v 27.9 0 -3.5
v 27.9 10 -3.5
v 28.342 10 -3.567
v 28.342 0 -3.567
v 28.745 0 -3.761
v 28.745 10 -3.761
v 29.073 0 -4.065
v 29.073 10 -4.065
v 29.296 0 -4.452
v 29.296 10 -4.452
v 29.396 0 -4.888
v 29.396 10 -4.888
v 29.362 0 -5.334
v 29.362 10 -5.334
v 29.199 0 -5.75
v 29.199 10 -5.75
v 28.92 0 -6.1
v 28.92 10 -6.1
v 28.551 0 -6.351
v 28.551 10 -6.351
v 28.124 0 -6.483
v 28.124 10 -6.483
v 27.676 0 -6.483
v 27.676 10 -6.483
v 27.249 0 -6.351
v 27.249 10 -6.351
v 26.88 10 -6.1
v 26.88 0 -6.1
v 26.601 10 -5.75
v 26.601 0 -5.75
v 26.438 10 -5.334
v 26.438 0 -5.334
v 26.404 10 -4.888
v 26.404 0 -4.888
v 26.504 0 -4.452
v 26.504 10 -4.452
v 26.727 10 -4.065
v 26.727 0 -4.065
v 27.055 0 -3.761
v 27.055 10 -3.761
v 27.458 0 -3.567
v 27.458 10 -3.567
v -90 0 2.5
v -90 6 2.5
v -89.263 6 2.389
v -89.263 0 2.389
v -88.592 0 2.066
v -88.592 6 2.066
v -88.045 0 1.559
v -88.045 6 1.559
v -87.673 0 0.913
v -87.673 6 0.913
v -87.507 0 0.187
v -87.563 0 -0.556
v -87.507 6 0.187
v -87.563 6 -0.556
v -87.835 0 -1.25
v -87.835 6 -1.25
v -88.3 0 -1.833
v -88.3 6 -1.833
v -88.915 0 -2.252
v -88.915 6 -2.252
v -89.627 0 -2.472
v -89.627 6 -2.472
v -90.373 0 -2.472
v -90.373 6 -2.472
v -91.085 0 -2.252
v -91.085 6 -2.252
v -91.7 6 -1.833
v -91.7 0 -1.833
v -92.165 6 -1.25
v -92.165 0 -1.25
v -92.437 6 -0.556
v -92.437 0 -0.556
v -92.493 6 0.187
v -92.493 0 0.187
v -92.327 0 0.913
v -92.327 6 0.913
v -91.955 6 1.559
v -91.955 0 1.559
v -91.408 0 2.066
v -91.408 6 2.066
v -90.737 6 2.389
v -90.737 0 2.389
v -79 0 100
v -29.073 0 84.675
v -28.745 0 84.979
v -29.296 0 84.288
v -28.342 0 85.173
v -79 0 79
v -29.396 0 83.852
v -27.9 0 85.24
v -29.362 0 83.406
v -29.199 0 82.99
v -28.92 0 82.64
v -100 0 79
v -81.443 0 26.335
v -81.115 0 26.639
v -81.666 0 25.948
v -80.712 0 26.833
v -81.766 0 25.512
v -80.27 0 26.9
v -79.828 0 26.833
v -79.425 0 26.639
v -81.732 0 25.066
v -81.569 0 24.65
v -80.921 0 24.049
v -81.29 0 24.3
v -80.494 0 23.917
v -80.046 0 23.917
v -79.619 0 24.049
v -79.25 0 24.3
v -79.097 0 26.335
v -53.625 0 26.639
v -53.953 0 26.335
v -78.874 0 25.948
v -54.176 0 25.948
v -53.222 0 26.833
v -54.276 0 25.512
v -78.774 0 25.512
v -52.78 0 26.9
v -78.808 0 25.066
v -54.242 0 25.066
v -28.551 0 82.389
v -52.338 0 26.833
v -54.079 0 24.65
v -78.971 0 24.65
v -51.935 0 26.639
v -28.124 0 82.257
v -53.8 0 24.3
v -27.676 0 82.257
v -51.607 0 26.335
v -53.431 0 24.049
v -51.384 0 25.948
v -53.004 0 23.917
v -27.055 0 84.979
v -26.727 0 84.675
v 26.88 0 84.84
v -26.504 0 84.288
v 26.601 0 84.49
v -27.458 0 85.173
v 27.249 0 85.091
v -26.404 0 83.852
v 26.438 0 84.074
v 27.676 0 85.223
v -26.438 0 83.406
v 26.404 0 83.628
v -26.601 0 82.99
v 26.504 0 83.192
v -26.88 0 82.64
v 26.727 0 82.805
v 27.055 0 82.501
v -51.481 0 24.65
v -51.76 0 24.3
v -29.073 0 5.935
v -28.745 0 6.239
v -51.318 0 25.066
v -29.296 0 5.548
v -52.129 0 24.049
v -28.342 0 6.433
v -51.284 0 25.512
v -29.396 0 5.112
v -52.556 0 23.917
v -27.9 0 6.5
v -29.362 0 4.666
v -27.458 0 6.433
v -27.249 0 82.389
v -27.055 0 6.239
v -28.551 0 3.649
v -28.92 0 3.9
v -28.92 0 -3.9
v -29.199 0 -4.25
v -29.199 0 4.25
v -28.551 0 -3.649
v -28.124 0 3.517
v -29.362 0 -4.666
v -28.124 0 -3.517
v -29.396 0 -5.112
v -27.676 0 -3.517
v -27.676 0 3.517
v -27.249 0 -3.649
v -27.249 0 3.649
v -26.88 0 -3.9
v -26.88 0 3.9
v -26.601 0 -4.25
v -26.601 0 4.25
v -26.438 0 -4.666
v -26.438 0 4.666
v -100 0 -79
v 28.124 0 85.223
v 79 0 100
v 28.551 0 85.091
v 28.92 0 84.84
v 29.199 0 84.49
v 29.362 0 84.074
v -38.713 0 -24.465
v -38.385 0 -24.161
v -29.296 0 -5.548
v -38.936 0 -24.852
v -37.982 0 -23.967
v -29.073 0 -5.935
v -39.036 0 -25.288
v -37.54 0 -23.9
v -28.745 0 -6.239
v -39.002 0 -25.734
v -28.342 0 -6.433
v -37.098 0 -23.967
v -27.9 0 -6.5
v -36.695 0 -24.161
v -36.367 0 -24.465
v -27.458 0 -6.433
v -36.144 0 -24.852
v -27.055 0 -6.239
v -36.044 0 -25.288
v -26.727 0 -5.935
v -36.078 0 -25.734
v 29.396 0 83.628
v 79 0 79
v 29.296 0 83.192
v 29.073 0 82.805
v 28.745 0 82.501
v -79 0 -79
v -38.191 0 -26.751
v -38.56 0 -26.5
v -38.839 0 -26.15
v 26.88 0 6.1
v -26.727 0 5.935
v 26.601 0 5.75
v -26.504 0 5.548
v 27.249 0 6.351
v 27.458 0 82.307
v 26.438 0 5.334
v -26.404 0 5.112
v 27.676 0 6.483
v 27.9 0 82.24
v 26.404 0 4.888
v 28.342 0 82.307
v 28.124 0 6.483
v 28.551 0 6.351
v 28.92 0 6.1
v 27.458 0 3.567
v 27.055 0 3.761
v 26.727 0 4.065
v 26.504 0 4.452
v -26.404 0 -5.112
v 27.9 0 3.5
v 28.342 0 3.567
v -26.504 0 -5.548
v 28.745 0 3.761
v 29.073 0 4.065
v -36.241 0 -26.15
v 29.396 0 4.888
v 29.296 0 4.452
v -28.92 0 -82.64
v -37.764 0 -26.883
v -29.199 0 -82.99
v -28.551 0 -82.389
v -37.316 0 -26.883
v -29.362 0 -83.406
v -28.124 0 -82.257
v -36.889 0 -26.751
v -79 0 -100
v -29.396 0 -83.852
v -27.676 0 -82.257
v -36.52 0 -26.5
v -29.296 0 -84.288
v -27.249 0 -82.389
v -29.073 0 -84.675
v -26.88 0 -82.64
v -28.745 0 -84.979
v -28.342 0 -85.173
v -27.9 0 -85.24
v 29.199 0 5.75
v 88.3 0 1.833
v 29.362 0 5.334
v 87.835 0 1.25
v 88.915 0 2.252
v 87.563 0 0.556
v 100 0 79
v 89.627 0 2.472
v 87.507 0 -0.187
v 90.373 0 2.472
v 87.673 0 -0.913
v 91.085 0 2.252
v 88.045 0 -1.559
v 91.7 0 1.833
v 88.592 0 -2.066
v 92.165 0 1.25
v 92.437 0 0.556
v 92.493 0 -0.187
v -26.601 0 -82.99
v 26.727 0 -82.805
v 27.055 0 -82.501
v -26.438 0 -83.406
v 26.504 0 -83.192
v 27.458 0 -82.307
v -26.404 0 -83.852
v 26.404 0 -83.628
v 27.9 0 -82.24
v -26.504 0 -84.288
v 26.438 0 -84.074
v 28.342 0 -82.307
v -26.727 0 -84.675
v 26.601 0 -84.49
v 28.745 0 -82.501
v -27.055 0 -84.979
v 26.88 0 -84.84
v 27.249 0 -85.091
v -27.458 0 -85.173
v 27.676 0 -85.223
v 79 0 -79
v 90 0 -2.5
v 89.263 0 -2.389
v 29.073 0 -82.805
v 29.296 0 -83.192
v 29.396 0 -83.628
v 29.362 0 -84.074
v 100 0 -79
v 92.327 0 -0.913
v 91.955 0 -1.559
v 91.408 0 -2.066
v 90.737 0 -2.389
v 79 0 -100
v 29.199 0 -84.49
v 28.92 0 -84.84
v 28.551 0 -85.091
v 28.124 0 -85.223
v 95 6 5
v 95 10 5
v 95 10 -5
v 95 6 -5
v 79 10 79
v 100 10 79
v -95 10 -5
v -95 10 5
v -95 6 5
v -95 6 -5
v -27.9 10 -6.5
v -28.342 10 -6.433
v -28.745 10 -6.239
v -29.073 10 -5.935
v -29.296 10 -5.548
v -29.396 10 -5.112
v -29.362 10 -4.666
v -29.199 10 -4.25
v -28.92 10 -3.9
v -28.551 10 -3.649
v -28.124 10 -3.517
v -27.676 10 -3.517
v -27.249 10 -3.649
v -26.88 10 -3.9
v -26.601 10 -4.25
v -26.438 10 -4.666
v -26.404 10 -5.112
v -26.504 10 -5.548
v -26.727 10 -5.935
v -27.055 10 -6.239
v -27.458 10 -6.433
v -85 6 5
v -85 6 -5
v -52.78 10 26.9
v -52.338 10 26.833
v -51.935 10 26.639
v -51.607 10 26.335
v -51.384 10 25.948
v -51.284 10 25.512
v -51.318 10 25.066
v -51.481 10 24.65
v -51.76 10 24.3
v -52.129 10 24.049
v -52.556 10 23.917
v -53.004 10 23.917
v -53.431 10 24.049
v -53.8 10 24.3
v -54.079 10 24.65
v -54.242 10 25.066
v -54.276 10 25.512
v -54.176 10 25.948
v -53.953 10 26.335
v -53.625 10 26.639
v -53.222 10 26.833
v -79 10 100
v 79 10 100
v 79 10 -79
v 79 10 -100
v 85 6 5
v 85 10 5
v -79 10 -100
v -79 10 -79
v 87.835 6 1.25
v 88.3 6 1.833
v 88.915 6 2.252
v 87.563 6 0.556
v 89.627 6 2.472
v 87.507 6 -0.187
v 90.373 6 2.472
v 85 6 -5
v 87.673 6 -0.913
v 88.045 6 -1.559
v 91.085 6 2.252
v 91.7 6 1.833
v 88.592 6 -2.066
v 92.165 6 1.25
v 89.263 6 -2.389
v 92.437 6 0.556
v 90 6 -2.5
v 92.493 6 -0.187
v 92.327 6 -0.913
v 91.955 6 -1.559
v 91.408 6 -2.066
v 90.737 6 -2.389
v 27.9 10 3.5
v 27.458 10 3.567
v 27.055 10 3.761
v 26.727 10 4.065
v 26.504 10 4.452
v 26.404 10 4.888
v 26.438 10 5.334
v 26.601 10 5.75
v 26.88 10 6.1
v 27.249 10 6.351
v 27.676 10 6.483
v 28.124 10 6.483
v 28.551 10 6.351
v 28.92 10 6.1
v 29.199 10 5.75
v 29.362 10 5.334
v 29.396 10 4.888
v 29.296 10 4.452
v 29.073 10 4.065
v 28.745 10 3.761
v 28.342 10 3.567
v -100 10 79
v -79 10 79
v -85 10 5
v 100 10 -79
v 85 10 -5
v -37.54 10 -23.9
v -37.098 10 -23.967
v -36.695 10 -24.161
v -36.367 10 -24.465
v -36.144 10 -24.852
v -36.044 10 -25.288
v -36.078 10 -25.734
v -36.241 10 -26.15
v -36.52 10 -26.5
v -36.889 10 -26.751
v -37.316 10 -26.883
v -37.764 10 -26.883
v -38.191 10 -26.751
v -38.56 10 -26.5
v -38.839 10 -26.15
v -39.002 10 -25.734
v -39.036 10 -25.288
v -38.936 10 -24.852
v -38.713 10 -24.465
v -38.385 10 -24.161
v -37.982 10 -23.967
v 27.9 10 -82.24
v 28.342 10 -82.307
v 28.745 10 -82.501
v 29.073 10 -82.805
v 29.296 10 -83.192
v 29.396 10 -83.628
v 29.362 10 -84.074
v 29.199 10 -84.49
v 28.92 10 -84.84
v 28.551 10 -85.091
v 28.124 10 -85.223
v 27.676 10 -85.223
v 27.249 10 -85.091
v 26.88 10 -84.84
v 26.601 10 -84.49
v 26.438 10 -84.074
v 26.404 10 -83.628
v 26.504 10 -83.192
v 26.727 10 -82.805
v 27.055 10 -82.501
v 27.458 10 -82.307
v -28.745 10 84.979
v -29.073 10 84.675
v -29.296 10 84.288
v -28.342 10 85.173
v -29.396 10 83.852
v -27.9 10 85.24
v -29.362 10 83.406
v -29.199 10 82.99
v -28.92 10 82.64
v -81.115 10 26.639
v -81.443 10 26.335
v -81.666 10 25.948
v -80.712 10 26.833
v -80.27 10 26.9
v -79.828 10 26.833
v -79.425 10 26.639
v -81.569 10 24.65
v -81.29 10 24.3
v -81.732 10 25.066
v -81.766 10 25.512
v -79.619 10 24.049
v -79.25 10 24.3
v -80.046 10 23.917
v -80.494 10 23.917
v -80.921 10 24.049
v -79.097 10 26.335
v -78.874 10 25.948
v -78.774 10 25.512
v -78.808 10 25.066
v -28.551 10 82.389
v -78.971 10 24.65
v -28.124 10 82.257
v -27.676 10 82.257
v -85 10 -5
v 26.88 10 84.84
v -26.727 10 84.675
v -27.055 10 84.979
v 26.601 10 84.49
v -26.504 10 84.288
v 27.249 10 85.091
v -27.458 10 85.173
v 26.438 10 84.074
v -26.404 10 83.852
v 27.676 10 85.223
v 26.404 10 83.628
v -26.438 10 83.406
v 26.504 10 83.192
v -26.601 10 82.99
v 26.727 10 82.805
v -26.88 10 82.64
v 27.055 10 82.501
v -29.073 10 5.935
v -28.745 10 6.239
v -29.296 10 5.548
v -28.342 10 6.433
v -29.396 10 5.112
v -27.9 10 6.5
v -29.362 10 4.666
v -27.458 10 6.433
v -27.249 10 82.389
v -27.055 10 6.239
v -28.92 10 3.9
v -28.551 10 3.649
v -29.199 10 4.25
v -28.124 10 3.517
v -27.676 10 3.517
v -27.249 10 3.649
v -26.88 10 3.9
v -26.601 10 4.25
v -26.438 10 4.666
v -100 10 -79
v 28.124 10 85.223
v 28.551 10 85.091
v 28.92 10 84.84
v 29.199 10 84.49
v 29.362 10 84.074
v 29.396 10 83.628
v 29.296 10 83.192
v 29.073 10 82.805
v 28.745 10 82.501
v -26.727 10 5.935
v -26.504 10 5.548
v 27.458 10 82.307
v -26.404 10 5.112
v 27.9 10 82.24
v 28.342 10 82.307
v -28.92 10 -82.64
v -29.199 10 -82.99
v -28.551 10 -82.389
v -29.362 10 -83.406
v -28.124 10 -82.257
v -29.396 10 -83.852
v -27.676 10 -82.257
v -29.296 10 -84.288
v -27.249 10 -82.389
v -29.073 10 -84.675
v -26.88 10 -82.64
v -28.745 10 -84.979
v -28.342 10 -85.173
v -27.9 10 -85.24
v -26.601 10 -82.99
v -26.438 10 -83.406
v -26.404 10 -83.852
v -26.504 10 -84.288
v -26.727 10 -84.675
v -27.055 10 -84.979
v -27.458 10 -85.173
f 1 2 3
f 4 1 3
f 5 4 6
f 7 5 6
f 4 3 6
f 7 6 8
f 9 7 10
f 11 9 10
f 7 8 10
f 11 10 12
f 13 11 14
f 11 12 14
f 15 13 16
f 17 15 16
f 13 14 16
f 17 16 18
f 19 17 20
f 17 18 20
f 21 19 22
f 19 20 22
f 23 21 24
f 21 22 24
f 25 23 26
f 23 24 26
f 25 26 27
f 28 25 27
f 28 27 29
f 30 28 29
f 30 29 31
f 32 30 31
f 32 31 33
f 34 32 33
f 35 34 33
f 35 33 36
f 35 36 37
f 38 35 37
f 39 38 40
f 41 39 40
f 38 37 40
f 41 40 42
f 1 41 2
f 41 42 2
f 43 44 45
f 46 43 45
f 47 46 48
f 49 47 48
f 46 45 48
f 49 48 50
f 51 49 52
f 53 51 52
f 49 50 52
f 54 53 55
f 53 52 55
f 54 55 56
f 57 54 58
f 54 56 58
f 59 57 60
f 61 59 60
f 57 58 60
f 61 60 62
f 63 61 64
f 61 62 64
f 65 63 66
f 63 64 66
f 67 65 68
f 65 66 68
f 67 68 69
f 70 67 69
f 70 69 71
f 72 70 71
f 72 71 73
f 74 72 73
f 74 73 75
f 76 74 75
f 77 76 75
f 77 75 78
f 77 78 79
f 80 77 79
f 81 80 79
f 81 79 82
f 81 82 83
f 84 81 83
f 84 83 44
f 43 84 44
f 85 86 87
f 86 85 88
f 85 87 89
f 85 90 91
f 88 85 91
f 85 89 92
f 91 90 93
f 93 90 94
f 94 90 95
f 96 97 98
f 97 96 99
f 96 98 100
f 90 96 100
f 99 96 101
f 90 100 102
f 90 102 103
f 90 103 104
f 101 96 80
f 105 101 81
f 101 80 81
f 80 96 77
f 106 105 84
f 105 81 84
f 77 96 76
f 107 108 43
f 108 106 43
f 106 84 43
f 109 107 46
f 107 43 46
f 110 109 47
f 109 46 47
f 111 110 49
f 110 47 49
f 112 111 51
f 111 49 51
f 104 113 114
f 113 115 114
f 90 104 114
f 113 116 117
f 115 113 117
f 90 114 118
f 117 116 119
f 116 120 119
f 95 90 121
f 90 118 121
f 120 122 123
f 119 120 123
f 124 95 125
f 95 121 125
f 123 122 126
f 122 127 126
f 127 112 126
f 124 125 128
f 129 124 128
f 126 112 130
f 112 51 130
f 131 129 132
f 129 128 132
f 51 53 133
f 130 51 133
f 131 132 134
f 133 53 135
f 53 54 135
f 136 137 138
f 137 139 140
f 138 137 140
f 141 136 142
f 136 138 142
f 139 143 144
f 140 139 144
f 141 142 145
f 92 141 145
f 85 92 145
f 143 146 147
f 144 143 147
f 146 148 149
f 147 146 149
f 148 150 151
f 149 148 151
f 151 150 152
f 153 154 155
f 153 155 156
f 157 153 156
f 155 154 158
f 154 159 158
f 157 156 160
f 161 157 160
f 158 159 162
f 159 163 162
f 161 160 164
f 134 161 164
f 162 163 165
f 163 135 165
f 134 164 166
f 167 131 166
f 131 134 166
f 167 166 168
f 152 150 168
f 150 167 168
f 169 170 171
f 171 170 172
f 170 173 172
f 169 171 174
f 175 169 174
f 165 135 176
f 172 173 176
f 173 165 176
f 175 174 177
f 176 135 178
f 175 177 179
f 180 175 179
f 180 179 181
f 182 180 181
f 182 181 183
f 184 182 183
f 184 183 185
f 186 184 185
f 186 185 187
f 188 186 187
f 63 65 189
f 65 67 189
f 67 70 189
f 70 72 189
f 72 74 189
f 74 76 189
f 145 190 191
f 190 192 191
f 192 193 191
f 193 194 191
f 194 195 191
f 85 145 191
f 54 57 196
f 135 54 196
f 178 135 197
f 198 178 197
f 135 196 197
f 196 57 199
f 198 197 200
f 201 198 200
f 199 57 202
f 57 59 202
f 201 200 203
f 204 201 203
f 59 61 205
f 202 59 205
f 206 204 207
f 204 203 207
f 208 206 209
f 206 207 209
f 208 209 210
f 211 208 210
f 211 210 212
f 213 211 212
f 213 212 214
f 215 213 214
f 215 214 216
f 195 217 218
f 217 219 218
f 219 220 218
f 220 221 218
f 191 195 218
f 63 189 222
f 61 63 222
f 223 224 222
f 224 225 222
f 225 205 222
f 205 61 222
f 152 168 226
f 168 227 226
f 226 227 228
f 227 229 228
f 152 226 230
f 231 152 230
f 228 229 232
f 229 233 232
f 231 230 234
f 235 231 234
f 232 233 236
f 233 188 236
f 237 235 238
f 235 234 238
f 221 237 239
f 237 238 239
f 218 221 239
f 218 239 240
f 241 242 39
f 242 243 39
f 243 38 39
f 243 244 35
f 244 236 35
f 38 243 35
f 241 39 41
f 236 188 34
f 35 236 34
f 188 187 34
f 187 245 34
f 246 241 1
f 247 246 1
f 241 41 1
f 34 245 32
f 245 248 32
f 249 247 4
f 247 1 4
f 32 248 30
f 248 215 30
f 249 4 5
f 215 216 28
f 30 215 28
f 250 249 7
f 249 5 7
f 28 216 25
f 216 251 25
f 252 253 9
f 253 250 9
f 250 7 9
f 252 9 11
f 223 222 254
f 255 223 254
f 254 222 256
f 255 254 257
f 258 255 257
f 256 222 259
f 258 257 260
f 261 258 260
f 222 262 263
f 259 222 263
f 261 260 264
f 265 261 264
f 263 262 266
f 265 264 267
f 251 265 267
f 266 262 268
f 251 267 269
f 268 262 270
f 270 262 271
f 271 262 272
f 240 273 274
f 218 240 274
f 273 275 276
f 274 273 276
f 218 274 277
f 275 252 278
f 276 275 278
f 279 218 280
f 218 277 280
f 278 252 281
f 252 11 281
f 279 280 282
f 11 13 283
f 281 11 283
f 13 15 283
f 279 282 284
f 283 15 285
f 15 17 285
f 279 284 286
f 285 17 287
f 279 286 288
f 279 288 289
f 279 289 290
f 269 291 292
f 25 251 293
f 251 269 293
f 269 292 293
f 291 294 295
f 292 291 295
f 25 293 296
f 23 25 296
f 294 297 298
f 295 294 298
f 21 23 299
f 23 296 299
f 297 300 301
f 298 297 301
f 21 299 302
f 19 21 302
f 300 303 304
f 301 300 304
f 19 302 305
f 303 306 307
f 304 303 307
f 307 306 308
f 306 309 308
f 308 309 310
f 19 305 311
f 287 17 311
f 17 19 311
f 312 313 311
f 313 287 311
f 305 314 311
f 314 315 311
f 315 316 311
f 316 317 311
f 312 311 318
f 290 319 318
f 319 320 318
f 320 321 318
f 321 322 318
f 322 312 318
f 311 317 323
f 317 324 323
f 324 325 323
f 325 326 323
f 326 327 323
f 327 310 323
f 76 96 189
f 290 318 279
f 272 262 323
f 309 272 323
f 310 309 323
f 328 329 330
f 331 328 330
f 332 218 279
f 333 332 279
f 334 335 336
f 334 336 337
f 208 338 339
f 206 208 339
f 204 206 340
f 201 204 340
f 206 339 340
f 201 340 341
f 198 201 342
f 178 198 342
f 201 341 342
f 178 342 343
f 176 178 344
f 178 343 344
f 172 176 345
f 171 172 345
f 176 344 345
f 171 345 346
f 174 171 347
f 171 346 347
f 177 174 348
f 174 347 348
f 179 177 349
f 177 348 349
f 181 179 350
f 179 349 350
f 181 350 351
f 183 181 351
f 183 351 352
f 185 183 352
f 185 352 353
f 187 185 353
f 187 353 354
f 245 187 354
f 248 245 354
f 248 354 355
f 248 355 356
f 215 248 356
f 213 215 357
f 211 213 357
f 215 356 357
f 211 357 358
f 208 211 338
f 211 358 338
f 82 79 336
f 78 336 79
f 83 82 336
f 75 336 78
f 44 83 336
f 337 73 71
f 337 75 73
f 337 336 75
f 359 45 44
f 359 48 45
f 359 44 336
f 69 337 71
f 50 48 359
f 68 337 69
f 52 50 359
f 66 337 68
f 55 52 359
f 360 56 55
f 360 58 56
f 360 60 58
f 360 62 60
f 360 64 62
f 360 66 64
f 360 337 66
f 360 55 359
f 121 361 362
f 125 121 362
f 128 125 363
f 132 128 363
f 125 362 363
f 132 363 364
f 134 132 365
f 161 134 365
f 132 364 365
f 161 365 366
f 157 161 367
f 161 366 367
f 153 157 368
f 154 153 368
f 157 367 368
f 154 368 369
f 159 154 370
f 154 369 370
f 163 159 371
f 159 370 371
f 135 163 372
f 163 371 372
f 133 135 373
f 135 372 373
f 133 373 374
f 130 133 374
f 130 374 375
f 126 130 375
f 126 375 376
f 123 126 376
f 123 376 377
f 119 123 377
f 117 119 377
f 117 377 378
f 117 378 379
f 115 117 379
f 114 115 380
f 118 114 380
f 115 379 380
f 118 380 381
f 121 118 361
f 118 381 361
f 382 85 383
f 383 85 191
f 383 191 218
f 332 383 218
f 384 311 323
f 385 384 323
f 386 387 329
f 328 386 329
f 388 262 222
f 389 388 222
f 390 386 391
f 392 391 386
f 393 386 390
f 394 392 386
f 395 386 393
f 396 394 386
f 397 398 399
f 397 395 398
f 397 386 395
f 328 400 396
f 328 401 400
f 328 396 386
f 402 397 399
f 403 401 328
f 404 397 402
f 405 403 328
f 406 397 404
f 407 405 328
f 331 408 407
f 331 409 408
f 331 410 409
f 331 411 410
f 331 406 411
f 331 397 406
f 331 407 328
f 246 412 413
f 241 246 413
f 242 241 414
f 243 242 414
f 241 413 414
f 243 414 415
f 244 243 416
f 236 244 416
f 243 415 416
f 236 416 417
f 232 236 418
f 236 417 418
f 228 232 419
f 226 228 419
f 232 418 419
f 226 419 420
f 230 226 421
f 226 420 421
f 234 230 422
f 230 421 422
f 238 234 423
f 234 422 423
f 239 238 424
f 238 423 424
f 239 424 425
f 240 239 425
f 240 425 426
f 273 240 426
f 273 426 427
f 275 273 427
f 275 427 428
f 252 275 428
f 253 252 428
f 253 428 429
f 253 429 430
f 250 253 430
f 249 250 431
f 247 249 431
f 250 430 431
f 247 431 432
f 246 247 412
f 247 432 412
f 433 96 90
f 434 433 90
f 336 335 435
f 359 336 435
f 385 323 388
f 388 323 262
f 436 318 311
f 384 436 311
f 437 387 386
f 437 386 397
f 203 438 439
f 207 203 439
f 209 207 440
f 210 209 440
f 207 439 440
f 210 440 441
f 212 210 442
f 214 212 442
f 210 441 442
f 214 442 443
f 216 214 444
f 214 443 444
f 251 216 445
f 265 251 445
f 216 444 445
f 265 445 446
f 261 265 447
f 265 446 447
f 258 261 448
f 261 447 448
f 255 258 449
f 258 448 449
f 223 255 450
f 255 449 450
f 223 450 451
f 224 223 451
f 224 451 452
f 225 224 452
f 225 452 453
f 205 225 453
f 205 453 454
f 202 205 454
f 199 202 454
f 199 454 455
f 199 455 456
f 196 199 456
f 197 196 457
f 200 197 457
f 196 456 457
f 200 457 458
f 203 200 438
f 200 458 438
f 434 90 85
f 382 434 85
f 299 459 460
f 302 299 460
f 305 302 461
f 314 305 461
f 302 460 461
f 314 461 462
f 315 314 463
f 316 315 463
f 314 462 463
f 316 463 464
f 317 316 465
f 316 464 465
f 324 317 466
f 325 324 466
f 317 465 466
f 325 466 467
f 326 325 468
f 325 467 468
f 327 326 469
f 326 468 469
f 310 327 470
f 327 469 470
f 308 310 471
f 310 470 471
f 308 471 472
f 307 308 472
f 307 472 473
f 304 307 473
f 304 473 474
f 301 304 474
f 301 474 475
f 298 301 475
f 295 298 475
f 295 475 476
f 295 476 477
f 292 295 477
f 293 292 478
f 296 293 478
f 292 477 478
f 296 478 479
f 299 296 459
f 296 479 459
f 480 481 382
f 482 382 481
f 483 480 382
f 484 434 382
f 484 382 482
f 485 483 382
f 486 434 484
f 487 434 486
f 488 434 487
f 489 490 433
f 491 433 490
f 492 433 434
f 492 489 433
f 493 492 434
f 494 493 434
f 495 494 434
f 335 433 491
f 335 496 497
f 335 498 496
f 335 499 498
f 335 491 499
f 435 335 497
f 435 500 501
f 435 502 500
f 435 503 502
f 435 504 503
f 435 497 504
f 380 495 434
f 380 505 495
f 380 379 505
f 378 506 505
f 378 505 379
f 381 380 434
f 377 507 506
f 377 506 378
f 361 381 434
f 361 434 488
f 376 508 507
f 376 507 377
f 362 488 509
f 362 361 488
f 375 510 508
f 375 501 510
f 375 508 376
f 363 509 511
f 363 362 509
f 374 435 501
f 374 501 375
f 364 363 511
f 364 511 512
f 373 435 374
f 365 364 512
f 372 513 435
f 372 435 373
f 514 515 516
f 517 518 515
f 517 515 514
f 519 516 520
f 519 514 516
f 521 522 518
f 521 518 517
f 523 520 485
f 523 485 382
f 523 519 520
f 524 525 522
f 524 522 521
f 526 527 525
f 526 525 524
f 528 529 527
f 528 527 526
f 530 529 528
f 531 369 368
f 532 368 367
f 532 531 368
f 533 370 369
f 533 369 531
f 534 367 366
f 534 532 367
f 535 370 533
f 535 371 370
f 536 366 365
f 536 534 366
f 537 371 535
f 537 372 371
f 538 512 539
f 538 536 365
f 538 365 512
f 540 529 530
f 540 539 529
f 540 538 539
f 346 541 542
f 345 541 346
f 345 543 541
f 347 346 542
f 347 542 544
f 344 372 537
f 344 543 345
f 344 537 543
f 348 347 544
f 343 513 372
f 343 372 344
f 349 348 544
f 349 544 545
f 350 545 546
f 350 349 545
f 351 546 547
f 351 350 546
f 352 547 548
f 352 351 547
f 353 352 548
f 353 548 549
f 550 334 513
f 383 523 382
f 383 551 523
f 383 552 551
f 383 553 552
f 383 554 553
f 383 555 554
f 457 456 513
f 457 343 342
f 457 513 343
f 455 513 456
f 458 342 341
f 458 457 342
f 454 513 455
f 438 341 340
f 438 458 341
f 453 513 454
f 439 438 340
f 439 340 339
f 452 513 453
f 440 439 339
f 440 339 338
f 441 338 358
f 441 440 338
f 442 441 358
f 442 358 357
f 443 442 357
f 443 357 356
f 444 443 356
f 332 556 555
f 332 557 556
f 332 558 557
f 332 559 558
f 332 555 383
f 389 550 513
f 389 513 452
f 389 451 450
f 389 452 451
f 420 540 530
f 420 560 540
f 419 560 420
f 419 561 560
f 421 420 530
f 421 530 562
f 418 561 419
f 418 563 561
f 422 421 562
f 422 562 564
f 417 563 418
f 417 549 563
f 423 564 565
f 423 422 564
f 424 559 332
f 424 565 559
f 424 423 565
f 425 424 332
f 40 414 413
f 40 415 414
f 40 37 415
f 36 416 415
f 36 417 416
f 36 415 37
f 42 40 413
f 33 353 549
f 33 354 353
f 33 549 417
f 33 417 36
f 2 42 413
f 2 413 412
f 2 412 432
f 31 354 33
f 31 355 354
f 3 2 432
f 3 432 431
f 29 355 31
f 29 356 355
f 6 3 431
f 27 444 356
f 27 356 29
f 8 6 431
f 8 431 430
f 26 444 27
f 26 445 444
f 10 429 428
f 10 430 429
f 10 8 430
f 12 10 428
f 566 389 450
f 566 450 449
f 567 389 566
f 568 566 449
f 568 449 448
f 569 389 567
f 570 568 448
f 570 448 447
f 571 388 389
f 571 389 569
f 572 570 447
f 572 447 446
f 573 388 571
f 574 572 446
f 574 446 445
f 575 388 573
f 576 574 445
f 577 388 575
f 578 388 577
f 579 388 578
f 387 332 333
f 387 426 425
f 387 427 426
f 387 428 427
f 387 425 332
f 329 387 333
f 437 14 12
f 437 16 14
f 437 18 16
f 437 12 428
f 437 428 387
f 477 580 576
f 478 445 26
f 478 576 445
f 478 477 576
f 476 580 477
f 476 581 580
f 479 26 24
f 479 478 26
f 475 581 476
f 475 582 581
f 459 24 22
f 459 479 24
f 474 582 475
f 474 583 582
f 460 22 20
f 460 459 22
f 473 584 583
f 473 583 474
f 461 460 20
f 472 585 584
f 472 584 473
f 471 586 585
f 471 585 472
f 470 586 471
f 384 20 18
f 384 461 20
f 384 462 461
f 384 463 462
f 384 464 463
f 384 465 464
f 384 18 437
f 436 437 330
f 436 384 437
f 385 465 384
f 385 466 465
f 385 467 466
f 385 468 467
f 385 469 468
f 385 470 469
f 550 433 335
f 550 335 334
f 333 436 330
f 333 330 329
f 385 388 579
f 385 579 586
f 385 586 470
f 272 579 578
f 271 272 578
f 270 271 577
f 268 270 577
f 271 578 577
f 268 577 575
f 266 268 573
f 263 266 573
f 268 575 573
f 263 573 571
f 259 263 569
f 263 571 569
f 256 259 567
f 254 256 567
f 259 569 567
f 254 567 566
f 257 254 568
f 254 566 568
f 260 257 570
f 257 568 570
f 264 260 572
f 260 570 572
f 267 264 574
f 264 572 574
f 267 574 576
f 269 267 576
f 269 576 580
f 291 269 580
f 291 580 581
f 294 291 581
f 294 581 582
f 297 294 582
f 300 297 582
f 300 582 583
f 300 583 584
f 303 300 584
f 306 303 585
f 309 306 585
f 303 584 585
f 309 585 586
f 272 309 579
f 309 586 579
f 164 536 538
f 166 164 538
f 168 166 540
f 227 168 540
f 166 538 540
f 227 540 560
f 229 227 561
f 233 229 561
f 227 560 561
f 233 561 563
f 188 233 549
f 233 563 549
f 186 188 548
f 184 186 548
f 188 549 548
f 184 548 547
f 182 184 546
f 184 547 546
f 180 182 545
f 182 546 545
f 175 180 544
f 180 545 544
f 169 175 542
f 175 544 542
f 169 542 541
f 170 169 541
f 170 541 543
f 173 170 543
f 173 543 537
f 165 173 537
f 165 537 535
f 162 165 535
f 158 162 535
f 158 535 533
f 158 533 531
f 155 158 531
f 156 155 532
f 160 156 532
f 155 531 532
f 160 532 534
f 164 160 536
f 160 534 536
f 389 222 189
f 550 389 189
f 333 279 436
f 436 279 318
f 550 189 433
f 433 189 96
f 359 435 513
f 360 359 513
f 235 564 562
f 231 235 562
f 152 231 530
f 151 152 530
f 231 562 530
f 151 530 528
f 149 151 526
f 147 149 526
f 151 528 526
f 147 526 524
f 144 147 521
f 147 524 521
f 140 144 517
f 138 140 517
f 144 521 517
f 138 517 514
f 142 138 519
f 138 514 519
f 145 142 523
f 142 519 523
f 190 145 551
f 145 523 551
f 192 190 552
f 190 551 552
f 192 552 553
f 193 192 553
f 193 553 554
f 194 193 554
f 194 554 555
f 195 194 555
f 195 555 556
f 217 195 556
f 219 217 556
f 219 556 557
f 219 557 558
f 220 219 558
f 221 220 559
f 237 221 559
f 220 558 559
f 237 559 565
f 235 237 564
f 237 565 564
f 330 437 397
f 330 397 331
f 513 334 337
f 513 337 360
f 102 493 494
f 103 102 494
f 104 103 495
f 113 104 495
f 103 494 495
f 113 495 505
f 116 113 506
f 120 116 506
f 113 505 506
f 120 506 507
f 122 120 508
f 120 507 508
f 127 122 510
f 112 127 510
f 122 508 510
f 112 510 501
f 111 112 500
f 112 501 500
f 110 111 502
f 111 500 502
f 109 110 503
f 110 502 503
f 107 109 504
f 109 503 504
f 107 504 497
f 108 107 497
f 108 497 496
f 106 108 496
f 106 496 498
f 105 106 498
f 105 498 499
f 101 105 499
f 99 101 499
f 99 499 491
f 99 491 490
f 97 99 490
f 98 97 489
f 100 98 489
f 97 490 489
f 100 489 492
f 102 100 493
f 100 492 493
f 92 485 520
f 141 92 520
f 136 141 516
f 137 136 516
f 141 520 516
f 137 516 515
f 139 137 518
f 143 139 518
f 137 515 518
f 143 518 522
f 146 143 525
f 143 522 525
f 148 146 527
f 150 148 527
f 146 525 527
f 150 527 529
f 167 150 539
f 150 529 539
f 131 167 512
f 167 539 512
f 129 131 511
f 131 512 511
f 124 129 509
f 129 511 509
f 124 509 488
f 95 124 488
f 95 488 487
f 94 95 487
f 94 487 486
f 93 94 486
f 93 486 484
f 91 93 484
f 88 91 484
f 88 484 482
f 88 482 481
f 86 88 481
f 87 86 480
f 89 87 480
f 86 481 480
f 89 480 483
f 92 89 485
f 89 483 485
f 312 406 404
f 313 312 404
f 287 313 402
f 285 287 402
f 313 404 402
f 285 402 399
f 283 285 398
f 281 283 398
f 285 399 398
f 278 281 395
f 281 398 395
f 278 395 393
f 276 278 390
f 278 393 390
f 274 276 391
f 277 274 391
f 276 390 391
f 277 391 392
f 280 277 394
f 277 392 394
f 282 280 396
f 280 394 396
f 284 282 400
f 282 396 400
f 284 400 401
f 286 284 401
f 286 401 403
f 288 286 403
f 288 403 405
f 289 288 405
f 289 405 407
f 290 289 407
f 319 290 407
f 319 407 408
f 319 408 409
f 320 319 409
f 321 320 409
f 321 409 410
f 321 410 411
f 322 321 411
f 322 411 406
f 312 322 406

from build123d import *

# Parameters (mm, degrees)
BOSS_EXTRUDE1_DEPTH = 10
SKETCH2_R           = 2.5
CUT_EXTRUDE1_DEPTH  = 10
SKETCH3_R           = 1.5
CUT_EXTRUDE2_DEPTH  = 10
SKETCH6_R           = 1.5
CUT_EXTRUDE3_DEPTH  = 10
SKETCH7_W           = 10
SKETCH7_H           = 10
CUT_EXTRUDE4_DEPTH  = 4


with BuildPart() as part:
    # Sketch1 → Boss-Extrude1 (new body)
    with BuildSketch(Plane(origin=(0, 0, 0), x_dir=(1, 0, 0), z_dir=(0, 1, 0))):
        Polygon((-79, 100), (-79, 79), (-100, 79), (-100, -79), (-79, -79), (-79, -100), (79, -100), (79, -79), (100, -79), (100, 79), (79, 79), (79, 100), align=None)
    extrude(amount=BOSS_EXTRUDE1_DEPTH)

    # Sketch2 → Cut-Extrude1 (cut)
    with BuildSketch(Plane(origin=(0, 10, 0), x_dir=(1, 0, 0), z_dir=(0, 1, 0))):
        with Locations(Location((-90, 0, 0), (0, 0, 270))):
            Circle(SKETCH2_R)
        with Locations(Location((90, 0, 0), (0, 0, 90))):
            Circle(SKETCH2_R)
    extrude(amount=-CUT_EXTRUDE1_DEPTH, mode=Mode.SUBTRACT)

    # Sketch3 → Cut-Extrude2 (cut)
    with BuildSketch(Plane(origin=(0, 10, 0), x_dir=(1, 0, 0), z_dir=(0, 1, 0))):
        with Locations(Location((27.9, 83.74, 0), (0, 0, 270))):
            Circle(SKETCH3_R)
        with Locations(Location((27.9, 5, 0), (0, 0, 270))):
            Circle(SKETCH3_R)
        with Locations(Location((-27.9, 5, 0), (0, 0, 90))):
            Circle(SKETCH3_R)
        with Locations(Location((-27.9, 83.74, 0), (0, 0, 90))):
            Circle(SKETCH3_R)
        with Locations(Location((-27.9, -5, 0), (0, 0, 270))):
            Circle(SKETCH3_R)
        with Locations(Location((27.9, -5, 0), (0, 0, 90))):
            Circle(SKETCH3_R)
        with Locations(Location((27.9, -83.74, 0), (0, 0, 90))):
            Circle(SKETCH3_R)
        with Locations(Location((-27.9, -83.74, 0), (0, 0, 270))):
            Circle(SKETCH3_R)
    extrude(amount=-CUT_EXTRUDE2_DEPTH, mode=Mode.SUBTRACT)

    # Sketch6 → Cut-Extrude3 (cut)
    with BuildSketch(Plane(origin=(0, 10, 0), x_dir=(1, 0, 0), z_dir=(0, 1, 0))):
        with Locations(Location((-37.54, 25.4, 0), (0, 0, 270))):
            Circle(SKETCH6_R)
        with Locations(Location((-52.78, -25.4, 0), (0, 0, 270))):
            Circle(SKETCH6_R)
        with Locations(Location((-80.27, -25.4, 0), (0, 0, 270))):
            Circle(SKETCH6_R)
    extrude(amount=-CUT_EXTRUDE3_DEPTH, mode=Mode.SUBTRACT)

    # Sketch7 → Cut-Extrude4 (cut)
    with BuildSketch(Plane(origin=(0, 10, 0), x_dir=(1, 0, 0), z_dir=(0, 1, 0))):
        with Locations((-90, 0)):
            Rectangle(SKETCH7_W, SKETCH7_H)
        with Locations((90, 0)):
            Rectangle(SKETCH7_W, SKETCH7_H)
    extrude(amount=-CUT_EXTRUDE4_DEPTH, mode=Mode.SUBTRACT)


solid = part.part
